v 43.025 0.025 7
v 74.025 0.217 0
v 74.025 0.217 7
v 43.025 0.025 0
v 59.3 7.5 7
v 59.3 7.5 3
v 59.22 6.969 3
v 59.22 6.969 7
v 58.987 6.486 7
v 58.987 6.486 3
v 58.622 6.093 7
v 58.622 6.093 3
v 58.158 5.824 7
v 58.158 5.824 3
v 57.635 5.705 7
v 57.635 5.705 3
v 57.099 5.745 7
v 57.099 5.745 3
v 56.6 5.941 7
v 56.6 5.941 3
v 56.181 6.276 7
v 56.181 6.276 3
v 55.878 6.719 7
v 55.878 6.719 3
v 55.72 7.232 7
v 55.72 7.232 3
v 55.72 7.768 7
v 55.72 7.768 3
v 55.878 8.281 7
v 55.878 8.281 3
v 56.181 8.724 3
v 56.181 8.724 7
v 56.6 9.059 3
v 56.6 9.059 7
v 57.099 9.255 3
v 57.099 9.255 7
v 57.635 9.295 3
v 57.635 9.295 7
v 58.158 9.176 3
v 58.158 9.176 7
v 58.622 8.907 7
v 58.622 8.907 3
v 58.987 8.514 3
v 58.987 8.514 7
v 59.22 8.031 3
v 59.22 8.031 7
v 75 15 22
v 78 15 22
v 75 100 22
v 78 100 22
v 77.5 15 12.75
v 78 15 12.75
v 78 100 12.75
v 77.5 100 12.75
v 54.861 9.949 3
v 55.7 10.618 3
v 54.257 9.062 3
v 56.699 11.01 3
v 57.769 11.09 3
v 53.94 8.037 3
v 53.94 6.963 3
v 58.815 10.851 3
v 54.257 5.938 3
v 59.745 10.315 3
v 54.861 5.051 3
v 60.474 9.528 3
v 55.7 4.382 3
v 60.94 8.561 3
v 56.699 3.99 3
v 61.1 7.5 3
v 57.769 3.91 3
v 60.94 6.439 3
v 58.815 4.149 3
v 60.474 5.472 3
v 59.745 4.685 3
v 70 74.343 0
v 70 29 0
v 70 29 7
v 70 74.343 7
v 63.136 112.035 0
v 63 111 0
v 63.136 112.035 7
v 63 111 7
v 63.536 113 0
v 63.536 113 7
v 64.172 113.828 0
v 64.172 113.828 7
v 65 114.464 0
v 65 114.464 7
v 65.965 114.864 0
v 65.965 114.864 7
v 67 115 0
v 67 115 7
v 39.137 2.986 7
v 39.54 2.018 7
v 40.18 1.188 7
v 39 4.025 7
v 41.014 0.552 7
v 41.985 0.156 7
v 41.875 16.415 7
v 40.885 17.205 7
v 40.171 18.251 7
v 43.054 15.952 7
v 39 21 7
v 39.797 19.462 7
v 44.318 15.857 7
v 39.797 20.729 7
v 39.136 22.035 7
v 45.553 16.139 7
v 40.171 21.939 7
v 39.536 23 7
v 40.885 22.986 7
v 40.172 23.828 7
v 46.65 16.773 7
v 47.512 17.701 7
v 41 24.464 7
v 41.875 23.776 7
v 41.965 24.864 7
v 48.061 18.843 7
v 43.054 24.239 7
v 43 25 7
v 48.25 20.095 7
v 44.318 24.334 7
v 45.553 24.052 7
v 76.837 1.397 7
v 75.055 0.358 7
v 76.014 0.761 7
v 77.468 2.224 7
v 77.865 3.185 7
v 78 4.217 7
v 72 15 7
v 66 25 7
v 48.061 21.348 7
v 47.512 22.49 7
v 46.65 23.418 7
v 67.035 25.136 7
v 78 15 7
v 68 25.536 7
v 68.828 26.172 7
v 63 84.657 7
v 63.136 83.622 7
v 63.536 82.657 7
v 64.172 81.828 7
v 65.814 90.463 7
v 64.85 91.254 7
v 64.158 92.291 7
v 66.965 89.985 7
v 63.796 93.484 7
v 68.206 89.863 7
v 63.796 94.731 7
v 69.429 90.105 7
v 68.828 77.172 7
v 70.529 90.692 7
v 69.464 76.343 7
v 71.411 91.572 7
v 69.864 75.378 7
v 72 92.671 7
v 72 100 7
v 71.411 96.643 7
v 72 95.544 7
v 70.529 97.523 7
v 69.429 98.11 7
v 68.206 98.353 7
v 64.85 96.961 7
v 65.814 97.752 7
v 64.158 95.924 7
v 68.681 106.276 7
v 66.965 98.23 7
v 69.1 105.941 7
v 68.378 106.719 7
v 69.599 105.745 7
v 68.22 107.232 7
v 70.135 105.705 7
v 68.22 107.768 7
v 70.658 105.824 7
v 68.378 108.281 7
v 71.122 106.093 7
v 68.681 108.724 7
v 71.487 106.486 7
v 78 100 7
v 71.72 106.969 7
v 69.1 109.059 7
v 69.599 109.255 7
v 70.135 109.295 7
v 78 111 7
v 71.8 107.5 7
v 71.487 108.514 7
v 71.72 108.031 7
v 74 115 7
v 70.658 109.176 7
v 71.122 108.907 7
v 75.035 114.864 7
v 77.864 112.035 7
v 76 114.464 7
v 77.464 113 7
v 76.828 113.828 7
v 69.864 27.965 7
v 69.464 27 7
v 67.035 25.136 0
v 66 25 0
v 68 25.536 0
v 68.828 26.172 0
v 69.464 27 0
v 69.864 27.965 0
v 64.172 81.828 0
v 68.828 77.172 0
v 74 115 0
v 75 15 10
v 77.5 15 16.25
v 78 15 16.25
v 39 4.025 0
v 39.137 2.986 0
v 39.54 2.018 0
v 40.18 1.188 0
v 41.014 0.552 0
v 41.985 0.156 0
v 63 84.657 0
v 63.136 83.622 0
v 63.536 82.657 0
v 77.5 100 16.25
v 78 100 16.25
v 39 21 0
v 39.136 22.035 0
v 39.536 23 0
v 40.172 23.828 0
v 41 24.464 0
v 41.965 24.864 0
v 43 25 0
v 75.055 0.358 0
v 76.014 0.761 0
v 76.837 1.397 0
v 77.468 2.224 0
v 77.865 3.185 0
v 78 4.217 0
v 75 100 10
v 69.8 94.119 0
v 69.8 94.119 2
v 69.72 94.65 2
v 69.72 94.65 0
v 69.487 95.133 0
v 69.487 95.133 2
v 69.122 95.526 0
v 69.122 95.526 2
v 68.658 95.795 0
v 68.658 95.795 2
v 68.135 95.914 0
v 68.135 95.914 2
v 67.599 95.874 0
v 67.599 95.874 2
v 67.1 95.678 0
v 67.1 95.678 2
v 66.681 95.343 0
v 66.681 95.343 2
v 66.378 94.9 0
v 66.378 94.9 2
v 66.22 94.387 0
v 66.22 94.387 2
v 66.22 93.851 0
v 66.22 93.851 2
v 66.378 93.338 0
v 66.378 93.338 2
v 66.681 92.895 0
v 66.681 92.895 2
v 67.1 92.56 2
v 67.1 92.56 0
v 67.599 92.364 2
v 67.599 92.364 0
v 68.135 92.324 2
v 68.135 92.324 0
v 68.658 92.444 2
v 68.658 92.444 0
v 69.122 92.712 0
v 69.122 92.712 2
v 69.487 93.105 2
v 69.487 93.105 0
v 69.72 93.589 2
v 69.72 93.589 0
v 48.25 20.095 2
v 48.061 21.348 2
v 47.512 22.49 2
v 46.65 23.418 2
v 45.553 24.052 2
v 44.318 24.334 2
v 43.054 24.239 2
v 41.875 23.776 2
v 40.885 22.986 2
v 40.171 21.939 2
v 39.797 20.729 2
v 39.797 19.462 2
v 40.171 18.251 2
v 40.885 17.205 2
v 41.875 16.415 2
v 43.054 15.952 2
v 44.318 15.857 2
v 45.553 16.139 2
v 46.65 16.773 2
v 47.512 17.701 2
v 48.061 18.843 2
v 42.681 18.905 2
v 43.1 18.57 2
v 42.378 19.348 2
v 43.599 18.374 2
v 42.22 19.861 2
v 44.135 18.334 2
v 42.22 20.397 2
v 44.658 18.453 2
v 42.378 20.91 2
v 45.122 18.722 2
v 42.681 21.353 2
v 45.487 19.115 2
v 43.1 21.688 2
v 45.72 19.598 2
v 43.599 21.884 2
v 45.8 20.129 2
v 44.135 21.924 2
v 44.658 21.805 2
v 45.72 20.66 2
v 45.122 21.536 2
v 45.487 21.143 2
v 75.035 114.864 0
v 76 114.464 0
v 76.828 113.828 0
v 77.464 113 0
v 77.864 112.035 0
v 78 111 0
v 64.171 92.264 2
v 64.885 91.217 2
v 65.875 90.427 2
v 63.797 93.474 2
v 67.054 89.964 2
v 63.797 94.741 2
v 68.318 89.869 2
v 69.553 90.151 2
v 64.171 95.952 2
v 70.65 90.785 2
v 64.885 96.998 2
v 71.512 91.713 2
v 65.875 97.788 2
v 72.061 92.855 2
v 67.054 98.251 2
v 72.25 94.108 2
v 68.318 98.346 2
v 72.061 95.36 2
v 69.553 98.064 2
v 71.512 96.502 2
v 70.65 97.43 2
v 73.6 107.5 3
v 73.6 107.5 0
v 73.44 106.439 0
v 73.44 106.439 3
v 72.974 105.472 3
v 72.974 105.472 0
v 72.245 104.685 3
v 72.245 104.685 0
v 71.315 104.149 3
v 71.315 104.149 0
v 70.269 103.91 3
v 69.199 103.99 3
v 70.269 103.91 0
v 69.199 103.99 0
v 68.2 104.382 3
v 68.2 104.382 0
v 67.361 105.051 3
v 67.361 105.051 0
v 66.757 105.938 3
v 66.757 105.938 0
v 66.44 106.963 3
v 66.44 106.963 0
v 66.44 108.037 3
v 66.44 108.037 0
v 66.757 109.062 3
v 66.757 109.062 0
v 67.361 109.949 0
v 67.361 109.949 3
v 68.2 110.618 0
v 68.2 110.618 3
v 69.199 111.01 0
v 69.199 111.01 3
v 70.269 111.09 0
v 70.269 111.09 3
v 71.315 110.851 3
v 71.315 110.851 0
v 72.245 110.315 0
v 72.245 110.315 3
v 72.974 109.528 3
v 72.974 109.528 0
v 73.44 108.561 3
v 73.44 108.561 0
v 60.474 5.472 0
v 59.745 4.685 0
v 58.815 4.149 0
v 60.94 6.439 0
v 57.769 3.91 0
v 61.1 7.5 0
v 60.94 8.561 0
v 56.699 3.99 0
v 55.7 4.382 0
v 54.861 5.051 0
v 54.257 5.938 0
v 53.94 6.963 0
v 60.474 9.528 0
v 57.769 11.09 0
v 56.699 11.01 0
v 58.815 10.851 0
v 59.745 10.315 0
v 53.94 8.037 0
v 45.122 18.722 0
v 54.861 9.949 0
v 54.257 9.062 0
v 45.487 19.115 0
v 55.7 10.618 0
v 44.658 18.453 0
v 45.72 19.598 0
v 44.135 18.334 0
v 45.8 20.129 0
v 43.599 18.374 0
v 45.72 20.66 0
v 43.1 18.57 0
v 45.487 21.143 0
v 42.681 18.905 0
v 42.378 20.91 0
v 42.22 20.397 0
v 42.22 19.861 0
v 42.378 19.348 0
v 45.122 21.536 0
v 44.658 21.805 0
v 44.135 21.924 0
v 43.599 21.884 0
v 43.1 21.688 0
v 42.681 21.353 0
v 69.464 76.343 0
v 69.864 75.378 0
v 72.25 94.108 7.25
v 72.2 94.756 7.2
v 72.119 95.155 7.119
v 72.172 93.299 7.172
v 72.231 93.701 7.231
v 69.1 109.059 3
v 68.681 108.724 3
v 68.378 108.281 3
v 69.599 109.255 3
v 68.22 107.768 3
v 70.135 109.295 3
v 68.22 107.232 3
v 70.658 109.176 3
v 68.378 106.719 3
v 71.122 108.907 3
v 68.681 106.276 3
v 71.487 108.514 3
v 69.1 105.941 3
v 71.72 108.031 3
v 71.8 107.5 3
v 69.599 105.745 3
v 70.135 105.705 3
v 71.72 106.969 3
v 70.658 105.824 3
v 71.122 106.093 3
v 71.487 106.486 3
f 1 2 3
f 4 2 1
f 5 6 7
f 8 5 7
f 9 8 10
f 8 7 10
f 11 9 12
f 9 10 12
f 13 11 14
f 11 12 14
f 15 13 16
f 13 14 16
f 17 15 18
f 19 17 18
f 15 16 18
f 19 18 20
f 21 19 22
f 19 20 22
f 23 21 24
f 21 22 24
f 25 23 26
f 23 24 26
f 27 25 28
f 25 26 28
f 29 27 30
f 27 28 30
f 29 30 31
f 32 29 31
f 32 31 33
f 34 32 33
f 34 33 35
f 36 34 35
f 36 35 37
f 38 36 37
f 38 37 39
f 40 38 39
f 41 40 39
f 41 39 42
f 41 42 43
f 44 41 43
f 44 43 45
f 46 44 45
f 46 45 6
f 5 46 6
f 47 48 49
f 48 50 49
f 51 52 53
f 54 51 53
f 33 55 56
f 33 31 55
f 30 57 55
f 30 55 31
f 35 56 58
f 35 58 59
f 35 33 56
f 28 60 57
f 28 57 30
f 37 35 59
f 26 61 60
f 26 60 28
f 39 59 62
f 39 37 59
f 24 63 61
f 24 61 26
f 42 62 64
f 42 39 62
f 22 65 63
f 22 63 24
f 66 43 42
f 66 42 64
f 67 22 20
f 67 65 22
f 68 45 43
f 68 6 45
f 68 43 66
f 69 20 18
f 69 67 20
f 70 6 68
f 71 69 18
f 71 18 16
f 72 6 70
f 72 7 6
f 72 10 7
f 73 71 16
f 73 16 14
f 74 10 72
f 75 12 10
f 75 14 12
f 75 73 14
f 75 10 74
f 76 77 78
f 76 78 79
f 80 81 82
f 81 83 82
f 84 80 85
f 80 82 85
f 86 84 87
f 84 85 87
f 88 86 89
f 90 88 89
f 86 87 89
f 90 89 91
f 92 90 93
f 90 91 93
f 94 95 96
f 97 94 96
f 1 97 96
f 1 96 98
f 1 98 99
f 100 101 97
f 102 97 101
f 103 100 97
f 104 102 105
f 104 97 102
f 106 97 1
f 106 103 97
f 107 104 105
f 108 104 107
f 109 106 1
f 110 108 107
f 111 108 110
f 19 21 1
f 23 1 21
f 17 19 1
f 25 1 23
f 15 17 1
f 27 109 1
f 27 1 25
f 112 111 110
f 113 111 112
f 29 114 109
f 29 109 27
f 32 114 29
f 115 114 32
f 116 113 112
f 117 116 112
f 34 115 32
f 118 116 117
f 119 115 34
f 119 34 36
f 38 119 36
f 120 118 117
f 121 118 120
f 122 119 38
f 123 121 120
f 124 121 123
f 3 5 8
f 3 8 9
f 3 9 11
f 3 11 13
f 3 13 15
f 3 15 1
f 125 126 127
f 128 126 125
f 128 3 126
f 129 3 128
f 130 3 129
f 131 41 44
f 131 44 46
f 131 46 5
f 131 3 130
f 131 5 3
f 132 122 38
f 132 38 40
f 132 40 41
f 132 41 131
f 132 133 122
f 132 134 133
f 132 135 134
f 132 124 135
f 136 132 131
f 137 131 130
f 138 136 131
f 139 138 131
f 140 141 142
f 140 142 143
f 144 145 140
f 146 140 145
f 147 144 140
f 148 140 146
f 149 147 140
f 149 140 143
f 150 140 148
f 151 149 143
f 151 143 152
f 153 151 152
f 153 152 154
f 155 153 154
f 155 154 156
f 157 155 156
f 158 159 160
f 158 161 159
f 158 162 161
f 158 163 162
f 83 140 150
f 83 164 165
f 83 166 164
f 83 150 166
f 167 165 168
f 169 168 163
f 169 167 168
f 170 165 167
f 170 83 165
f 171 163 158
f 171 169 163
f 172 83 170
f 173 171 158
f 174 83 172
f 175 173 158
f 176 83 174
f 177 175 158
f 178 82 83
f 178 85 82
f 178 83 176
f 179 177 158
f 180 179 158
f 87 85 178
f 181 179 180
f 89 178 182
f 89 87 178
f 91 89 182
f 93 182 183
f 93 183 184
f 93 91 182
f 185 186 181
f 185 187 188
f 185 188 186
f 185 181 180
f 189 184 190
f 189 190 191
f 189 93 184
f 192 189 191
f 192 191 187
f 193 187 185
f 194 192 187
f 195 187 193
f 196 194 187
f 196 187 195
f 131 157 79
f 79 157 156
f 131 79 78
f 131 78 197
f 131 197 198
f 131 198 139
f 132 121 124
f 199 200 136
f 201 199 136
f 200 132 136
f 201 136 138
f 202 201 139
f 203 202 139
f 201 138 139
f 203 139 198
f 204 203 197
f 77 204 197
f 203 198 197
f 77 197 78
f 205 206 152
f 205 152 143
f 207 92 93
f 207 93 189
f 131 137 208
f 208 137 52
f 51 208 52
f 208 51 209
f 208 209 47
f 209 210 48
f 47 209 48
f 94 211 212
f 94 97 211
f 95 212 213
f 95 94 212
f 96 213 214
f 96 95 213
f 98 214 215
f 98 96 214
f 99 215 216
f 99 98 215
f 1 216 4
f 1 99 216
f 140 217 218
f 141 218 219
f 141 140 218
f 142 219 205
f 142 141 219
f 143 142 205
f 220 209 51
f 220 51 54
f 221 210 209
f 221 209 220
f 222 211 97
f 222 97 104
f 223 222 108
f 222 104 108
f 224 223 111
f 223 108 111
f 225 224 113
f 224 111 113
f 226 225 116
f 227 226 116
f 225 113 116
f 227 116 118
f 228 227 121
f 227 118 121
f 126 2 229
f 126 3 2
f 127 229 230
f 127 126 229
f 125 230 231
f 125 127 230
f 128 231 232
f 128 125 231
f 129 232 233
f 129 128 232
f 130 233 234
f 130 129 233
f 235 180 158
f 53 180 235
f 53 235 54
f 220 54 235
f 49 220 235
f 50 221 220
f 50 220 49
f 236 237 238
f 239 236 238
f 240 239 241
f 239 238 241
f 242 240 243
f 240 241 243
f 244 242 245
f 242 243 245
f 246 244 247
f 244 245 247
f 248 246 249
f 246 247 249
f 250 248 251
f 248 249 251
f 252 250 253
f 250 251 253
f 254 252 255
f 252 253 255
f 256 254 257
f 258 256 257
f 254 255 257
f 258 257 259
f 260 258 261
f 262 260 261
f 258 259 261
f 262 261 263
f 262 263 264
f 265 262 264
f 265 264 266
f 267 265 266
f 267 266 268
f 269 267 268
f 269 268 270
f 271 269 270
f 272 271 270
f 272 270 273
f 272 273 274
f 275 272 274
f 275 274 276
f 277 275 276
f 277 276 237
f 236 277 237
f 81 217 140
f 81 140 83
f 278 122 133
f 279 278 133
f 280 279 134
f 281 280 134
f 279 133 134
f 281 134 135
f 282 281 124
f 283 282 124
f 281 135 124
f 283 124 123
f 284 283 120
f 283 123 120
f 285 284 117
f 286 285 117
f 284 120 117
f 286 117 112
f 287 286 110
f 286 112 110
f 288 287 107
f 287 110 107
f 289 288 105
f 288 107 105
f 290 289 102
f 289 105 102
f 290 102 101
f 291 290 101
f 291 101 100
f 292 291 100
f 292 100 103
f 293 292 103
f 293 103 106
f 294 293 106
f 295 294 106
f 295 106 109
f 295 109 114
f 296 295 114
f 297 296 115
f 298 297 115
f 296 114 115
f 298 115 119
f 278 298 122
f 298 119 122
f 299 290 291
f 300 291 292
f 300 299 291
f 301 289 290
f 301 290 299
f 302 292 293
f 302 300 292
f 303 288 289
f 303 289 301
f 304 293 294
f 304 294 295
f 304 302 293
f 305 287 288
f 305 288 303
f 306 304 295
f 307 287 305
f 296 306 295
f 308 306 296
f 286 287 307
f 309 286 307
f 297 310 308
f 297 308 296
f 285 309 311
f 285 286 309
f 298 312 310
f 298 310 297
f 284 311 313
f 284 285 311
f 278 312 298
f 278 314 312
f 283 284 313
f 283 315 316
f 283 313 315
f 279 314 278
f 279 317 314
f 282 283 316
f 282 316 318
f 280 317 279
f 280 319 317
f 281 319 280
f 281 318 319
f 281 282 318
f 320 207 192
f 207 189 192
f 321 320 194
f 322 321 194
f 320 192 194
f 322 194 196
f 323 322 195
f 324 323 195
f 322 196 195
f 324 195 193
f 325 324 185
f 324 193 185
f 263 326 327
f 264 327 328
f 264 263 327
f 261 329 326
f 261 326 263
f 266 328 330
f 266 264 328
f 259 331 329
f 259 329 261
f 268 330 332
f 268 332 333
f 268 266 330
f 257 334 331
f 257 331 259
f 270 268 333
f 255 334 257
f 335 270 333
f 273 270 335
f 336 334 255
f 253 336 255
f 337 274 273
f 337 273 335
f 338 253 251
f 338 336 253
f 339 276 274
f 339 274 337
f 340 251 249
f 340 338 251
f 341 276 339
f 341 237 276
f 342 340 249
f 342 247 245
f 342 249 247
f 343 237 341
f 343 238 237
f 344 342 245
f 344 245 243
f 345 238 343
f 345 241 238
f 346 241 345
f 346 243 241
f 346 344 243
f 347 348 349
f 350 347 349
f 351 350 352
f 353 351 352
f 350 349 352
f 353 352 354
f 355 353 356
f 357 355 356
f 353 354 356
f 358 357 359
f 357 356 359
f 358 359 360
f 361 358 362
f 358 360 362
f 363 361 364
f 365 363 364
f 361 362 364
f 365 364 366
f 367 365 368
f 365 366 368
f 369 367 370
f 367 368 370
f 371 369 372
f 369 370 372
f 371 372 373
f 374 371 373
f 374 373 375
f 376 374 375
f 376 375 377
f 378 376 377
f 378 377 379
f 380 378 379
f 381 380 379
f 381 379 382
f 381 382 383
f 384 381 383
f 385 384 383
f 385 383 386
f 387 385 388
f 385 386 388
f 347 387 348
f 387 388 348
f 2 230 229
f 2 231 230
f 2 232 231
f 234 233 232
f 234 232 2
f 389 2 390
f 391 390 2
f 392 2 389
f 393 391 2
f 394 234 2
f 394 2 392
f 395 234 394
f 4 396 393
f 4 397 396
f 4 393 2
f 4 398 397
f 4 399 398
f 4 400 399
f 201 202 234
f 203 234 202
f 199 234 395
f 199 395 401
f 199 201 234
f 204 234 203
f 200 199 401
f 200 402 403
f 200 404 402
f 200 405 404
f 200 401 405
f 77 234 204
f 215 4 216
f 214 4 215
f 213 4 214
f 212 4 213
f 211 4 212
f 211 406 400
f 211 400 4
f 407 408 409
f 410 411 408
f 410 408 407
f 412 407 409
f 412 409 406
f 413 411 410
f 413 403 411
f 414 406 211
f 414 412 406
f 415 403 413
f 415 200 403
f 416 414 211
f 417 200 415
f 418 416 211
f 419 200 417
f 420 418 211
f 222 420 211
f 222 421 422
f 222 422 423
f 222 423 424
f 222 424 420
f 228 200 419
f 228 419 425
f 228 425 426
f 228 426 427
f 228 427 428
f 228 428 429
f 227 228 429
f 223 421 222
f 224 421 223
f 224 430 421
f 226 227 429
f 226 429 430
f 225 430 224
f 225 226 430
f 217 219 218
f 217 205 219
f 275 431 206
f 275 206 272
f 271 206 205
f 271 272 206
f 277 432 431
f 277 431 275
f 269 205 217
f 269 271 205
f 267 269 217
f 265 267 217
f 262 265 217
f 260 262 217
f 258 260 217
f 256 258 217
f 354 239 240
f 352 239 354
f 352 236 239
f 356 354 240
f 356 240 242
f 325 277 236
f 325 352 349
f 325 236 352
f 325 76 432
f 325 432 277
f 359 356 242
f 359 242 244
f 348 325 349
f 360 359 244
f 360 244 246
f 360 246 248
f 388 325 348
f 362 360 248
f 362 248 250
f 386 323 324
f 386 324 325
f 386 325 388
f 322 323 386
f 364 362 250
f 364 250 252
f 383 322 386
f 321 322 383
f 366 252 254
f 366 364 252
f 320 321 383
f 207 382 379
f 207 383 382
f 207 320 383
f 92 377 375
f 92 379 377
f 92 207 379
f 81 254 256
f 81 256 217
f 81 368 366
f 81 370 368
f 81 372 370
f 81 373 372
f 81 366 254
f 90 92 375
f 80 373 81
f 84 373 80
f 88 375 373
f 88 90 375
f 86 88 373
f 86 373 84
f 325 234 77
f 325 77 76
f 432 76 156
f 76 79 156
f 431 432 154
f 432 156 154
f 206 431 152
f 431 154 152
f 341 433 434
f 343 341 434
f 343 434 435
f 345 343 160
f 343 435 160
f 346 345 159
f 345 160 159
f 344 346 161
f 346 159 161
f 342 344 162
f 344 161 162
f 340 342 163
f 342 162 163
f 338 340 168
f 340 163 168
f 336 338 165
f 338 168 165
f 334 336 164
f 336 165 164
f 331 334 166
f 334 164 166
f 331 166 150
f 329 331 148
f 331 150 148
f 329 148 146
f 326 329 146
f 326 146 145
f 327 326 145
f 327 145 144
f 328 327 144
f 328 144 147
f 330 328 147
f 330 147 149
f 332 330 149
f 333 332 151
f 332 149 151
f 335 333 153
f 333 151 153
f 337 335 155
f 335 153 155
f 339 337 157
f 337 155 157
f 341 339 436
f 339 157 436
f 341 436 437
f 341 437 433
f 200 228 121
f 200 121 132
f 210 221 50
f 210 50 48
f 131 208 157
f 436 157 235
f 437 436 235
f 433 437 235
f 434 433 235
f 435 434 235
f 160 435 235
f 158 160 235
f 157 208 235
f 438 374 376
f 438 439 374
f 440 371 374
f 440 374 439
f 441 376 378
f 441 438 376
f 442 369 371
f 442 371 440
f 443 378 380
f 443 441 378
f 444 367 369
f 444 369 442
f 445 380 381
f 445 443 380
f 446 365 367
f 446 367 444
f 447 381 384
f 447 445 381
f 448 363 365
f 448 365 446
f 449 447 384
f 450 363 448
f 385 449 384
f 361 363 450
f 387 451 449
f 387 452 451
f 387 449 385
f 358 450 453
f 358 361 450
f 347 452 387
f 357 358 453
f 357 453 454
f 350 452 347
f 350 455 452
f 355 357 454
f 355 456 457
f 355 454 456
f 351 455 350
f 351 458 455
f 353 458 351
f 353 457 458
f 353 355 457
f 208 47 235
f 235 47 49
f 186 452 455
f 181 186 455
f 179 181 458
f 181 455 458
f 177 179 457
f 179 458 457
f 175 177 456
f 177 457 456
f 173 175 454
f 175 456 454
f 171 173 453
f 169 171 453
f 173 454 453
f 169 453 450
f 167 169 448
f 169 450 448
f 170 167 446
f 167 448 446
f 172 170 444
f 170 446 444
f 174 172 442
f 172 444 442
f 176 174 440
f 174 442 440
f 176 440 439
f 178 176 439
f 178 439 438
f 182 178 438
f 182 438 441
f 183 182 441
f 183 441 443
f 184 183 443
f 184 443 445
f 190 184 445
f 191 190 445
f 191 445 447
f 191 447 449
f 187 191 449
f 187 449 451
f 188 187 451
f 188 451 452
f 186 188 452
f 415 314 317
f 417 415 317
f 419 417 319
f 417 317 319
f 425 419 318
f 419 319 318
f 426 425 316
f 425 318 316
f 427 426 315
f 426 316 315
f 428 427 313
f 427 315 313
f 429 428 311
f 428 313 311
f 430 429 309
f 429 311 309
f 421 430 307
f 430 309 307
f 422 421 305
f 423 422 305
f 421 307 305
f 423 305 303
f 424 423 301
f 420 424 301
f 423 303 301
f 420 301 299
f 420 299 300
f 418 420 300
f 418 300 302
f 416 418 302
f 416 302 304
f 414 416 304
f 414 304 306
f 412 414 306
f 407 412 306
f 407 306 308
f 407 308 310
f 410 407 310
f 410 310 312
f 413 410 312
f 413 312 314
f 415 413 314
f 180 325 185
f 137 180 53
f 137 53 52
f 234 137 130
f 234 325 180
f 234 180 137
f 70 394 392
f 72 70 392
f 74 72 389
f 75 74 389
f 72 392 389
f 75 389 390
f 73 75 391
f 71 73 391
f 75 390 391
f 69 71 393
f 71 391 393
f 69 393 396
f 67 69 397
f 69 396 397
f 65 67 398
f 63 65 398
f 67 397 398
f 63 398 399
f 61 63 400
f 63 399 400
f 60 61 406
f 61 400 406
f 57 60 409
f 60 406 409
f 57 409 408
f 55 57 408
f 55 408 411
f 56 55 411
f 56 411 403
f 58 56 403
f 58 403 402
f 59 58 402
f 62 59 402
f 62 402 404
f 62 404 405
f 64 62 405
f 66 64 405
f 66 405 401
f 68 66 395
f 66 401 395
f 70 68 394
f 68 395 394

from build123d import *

# Parameters (mm, degrees)
PAD_DEPTH       = 22
SKETCH001_W     = 16
SKETCH001_H     = 16
POCKET_DEPTH    = 39.001
SKETCH002_W     = 38
SKETCH002_H     = 85
POCKET001_DEPTH = 15
SKETCH003_R     = 1.8
POCKET002_DEPTH = 7.001
SKETCH004_R     = 3.6
POCKET003_DEPTH = 3
FILLET_R        = 4
FILLET001_R     = 4
SKETCH005_W     = 87.5
SKETCH005_H     = 3.5
POCKET004_DEPTH = 0.5
SKETCH006_R     = 1.8
POCKET005_DEPTH = 22.001
SKETCH007_R     = 3.6
POCKET006_DEPTH = 3
FILLET002_R     = 4
CHAMFER_SIZE    = 3
SKETCH018_R     = 4.25
POCKET016_DEPTH = 5


with BuildPart() as part:
    # Sketch → Pad (new body)
    with BuildSketch(Plane.XY):
        Polygon((39, 0), (39, 25), (70, 25), (70, 76), (63, 83), (63, 115), (78, 115), (78, 0.241195), align=None)
    extrude(amount=PAD_DEPTH)

    # Sketch001 → Pocket (cut, through all)
    with BuildSketch(Plane.YZ.offset(78)):
        with Locations((7, 15)):
            Rectangle(SKETCH001_W, SKETCH001_H)
        with Locations((108, 15)):
            Rectangle(SKETCH001_W, SKETCH001_H)
    extrude(amount=-POCKET_DEPTH, mode=Mode.SUBTRACT)

    # Sketch002 → Pocket001 (cut)
    with BuildSketch(Plane.XY.offset(22)):
        with Locations((56, 57.5)):
            Rectangle(SKETCH002_W, SKETCH002_H)
    extrude(amount=-POCKET001_DEPTH, mode=Mode.SUBTRACT)

    # Sketch003 → Pocket002 (cut, through all)
    with BuildSketch(Plane.XY.offset(7)):
        with Locations((68, 94.119095)):
            Circle(SKETCH003_R)
        with Locations((44, 20.129047)):
            Circle(SKETCH003_R)
    extrude(amount=-POCKET002_DEPTH, mode=Mode.SUBTRACT)

    # Sketch004 → Pocket003 (cut)
    with BuildSketch(Plane.XY.offset(7)):
        with Locations((68, 94.116013)):
            Circle(SKETCH004_R)
        with Locations((44, 20.124216)):
            Circle(SKETCH004_R)
    extrude(amount=-POCKET003_DEPTH, mode=Mode.SUBTRACT)

    # Fillet
    fillet_edges = [part.edges().sort_by_distance(p)[0] for p in [
        (39, 25, 3.5),
        (70, 25, 3.5),
    ]]
    fillet(fillet_edges, radius=FILLET_R)

    # Fillet001
    fillet001_edges = [part.edges().sort_by_distance(p)[0] for p in [
        (63, 83, 3.5),
        (70, 76, 3.5),
    ]]
    fillet(fillet001_edges, radius=FILLET001_R)

    # Sketch005 → Pocket004 (cut)
    with BuildSketch(Plane.YZ.offset(78)):
        with Locations((57.25, 14.5)):
            Rectangle(SKETCH005_W, SKETCH005_H)
    extrude(amount=-POCKET004_DEPTH, mode=Mode.SUBTRACT)

    # Sketch006 → Pocket005 (cut, through all)
    with BuildSketch(Plane(origin=(0, 0, 0), x_dir=(1, 0, 0), z_dir=(0, 0, -1))):
        with Locations((70, -107.5)):
            Circle(SKETCH006_R)
        with Locations((57.5, -7.5)):
            Circle(SKETCH006_R)
    extrude(amount=-POCKET005_DEPTH, mode=Mode.SUBTRACT)

    # Sketch007 → Pocket006 (cut)
    with BuildSketch(Plane(origin=(0, 0, 0), x_dir=(1, 0, 0), z_dir=(0, 0, -1))):
        with Locations((57.5, -7.5)):
            Circle(SKETCH007_R)
        with Locations((70, -107.5)):
            Circle(SKETCH007_R)
    extrude(amount=-POCKET006_DEPTH, mode=Mode.SUBTRACT)

    # Fillet002
    fillet002_edges = [part.edges().sort_by_distance(p)[0] for p in [
        (39, 0, 3.5),
        (78, 0.241195, 3.5),
        (78, 115, 3.5),
        (63, 115, 3.5),
    ]]
    fillet(fillet002_edges, radius=FILLET002_R)

    # Chamfer
    chamfer_edges = [part.edges().sort_by_distance(p)[0] for p in [
        (75, 57.5, 7),
    ]]
    chamfer(chamfer_edges, length=CHAMFER_SIZE)

    # Sketch018 → Pocket016 (cut, symmetric)
    with BuildSketch(Plane.XY.offset(7)):
        with Locations((44, 20.095486)):
            Circle(SKETCH018_R)
        with Locations((68, 94.107513)):
            Circle(SKETCH018_R)
    extrude(amount=POCKET016_DEPTH, both=True, mode=Mode.SUBTRACT)


solid = part.part
